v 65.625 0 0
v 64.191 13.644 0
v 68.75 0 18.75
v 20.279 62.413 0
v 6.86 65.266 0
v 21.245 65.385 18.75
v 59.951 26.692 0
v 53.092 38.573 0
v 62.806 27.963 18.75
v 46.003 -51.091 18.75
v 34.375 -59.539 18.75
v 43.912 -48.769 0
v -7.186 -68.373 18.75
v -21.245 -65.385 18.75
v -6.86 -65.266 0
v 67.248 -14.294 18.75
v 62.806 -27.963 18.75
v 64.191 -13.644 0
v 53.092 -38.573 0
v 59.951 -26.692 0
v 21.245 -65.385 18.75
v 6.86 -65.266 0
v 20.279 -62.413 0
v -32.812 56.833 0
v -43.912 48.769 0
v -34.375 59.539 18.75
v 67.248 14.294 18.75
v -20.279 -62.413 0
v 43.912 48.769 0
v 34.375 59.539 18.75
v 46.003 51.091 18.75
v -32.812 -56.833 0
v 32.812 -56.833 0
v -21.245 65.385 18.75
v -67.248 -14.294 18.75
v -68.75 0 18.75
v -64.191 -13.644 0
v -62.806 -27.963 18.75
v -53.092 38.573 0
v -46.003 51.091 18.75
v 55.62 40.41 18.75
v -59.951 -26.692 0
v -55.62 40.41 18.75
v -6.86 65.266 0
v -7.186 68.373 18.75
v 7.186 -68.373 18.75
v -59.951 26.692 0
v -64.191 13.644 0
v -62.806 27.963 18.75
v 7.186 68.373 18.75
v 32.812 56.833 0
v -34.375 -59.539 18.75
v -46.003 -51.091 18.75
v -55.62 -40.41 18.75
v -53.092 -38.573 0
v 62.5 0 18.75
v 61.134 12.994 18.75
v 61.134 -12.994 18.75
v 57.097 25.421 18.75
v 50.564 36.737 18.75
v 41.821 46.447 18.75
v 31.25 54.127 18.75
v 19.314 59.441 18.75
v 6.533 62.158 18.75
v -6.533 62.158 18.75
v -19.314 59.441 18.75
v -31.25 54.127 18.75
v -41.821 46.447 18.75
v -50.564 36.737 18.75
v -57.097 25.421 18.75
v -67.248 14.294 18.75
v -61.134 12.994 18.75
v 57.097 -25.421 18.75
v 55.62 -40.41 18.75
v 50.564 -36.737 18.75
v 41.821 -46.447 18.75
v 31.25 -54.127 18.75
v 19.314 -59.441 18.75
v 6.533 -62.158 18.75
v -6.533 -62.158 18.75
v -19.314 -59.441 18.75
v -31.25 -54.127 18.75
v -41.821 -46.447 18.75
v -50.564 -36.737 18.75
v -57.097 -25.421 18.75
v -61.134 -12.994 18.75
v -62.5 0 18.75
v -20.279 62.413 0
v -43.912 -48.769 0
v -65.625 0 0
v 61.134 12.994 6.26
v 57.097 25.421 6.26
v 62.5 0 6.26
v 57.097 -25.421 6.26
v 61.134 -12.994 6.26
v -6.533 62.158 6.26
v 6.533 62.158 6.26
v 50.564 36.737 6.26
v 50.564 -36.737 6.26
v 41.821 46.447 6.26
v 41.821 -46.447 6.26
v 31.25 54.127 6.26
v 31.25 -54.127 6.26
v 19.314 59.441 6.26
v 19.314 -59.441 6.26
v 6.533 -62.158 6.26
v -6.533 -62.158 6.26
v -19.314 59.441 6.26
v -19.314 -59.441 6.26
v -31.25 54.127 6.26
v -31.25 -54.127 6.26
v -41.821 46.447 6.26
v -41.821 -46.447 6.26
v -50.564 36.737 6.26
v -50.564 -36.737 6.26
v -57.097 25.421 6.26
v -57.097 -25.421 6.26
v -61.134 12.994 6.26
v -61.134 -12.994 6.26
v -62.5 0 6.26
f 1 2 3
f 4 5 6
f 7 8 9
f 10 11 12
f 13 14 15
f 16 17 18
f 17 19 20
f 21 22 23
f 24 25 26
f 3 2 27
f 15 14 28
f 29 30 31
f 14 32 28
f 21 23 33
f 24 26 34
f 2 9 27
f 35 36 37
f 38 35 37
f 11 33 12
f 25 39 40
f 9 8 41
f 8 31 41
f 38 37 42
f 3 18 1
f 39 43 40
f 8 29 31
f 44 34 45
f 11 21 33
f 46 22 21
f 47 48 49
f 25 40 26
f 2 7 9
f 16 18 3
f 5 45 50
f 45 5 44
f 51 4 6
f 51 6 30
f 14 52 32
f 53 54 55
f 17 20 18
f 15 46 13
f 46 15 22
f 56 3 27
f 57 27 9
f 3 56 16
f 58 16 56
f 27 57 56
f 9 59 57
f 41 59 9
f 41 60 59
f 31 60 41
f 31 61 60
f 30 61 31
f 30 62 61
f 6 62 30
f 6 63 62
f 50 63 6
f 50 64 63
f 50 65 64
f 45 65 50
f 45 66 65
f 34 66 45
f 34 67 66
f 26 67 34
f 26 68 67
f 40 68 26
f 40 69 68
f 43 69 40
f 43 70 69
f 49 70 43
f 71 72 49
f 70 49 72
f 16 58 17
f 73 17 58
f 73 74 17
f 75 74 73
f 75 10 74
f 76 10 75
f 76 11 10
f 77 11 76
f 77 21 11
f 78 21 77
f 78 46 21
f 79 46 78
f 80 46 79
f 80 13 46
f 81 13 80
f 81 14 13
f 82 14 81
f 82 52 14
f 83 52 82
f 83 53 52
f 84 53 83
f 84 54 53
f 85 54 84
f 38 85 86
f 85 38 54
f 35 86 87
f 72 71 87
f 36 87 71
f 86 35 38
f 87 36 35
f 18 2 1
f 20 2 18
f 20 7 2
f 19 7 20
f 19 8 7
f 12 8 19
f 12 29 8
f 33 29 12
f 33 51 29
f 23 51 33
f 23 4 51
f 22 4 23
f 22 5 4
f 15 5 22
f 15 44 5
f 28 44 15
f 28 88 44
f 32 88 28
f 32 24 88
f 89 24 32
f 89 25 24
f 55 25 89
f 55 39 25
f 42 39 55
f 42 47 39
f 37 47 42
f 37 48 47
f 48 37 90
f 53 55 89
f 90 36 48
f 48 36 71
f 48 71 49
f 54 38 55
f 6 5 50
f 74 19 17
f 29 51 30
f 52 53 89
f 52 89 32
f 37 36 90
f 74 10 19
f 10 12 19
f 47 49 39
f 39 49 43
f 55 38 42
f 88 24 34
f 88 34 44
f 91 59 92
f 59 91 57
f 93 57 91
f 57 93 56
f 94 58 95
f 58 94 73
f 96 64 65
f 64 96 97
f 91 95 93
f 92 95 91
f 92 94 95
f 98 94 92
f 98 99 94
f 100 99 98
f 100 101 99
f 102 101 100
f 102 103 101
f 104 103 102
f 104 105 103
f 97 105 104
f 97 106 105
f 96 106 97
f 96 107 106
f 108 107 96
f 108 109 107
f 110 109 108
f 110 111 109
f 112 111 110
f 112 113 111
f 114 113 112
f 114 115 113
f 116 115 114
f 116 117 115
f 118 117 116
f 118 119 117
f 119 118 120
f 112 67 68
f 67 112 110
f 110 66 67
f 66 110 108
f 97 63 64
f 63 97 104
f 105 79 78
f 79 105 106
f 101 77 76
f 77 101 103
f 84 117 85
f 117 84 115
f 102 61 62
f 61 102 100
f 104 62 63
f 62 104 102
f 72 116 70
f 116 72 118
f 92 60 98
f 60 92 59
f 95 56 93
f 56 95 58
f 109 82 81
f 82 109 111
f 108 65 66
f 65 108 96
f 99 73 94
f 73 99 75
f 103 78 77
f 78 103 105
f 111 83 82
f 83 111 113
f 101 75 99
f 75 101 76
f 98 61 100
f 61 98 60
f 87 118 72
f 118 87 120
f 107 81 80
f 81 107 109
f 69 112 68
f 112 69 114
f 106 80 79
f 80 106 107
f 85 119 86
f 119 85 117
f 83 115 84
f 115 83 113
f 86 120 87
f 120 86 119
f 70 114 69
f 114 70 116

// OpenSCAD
pot_width = 4.75 * 25;
stand_thickness = .25 * 25;
lip_height = .5 * 25;
extra_bottom = .5 * 25;
extra_top = .75 * 25;

difference() {
	cylinder(stand_thickness + lip_height,
					 (pot_width + extra_bottom) / 2,
					 (pot_width + extra_top) / 2,
					 false);
	translate([0, 0, stand_thickness + 0.01])
	cylinder(lip_height,
					 (pot_width + stand_thickness) / 2,
					 (pot_width + stand_thickness) / 2,
					 false);
}
